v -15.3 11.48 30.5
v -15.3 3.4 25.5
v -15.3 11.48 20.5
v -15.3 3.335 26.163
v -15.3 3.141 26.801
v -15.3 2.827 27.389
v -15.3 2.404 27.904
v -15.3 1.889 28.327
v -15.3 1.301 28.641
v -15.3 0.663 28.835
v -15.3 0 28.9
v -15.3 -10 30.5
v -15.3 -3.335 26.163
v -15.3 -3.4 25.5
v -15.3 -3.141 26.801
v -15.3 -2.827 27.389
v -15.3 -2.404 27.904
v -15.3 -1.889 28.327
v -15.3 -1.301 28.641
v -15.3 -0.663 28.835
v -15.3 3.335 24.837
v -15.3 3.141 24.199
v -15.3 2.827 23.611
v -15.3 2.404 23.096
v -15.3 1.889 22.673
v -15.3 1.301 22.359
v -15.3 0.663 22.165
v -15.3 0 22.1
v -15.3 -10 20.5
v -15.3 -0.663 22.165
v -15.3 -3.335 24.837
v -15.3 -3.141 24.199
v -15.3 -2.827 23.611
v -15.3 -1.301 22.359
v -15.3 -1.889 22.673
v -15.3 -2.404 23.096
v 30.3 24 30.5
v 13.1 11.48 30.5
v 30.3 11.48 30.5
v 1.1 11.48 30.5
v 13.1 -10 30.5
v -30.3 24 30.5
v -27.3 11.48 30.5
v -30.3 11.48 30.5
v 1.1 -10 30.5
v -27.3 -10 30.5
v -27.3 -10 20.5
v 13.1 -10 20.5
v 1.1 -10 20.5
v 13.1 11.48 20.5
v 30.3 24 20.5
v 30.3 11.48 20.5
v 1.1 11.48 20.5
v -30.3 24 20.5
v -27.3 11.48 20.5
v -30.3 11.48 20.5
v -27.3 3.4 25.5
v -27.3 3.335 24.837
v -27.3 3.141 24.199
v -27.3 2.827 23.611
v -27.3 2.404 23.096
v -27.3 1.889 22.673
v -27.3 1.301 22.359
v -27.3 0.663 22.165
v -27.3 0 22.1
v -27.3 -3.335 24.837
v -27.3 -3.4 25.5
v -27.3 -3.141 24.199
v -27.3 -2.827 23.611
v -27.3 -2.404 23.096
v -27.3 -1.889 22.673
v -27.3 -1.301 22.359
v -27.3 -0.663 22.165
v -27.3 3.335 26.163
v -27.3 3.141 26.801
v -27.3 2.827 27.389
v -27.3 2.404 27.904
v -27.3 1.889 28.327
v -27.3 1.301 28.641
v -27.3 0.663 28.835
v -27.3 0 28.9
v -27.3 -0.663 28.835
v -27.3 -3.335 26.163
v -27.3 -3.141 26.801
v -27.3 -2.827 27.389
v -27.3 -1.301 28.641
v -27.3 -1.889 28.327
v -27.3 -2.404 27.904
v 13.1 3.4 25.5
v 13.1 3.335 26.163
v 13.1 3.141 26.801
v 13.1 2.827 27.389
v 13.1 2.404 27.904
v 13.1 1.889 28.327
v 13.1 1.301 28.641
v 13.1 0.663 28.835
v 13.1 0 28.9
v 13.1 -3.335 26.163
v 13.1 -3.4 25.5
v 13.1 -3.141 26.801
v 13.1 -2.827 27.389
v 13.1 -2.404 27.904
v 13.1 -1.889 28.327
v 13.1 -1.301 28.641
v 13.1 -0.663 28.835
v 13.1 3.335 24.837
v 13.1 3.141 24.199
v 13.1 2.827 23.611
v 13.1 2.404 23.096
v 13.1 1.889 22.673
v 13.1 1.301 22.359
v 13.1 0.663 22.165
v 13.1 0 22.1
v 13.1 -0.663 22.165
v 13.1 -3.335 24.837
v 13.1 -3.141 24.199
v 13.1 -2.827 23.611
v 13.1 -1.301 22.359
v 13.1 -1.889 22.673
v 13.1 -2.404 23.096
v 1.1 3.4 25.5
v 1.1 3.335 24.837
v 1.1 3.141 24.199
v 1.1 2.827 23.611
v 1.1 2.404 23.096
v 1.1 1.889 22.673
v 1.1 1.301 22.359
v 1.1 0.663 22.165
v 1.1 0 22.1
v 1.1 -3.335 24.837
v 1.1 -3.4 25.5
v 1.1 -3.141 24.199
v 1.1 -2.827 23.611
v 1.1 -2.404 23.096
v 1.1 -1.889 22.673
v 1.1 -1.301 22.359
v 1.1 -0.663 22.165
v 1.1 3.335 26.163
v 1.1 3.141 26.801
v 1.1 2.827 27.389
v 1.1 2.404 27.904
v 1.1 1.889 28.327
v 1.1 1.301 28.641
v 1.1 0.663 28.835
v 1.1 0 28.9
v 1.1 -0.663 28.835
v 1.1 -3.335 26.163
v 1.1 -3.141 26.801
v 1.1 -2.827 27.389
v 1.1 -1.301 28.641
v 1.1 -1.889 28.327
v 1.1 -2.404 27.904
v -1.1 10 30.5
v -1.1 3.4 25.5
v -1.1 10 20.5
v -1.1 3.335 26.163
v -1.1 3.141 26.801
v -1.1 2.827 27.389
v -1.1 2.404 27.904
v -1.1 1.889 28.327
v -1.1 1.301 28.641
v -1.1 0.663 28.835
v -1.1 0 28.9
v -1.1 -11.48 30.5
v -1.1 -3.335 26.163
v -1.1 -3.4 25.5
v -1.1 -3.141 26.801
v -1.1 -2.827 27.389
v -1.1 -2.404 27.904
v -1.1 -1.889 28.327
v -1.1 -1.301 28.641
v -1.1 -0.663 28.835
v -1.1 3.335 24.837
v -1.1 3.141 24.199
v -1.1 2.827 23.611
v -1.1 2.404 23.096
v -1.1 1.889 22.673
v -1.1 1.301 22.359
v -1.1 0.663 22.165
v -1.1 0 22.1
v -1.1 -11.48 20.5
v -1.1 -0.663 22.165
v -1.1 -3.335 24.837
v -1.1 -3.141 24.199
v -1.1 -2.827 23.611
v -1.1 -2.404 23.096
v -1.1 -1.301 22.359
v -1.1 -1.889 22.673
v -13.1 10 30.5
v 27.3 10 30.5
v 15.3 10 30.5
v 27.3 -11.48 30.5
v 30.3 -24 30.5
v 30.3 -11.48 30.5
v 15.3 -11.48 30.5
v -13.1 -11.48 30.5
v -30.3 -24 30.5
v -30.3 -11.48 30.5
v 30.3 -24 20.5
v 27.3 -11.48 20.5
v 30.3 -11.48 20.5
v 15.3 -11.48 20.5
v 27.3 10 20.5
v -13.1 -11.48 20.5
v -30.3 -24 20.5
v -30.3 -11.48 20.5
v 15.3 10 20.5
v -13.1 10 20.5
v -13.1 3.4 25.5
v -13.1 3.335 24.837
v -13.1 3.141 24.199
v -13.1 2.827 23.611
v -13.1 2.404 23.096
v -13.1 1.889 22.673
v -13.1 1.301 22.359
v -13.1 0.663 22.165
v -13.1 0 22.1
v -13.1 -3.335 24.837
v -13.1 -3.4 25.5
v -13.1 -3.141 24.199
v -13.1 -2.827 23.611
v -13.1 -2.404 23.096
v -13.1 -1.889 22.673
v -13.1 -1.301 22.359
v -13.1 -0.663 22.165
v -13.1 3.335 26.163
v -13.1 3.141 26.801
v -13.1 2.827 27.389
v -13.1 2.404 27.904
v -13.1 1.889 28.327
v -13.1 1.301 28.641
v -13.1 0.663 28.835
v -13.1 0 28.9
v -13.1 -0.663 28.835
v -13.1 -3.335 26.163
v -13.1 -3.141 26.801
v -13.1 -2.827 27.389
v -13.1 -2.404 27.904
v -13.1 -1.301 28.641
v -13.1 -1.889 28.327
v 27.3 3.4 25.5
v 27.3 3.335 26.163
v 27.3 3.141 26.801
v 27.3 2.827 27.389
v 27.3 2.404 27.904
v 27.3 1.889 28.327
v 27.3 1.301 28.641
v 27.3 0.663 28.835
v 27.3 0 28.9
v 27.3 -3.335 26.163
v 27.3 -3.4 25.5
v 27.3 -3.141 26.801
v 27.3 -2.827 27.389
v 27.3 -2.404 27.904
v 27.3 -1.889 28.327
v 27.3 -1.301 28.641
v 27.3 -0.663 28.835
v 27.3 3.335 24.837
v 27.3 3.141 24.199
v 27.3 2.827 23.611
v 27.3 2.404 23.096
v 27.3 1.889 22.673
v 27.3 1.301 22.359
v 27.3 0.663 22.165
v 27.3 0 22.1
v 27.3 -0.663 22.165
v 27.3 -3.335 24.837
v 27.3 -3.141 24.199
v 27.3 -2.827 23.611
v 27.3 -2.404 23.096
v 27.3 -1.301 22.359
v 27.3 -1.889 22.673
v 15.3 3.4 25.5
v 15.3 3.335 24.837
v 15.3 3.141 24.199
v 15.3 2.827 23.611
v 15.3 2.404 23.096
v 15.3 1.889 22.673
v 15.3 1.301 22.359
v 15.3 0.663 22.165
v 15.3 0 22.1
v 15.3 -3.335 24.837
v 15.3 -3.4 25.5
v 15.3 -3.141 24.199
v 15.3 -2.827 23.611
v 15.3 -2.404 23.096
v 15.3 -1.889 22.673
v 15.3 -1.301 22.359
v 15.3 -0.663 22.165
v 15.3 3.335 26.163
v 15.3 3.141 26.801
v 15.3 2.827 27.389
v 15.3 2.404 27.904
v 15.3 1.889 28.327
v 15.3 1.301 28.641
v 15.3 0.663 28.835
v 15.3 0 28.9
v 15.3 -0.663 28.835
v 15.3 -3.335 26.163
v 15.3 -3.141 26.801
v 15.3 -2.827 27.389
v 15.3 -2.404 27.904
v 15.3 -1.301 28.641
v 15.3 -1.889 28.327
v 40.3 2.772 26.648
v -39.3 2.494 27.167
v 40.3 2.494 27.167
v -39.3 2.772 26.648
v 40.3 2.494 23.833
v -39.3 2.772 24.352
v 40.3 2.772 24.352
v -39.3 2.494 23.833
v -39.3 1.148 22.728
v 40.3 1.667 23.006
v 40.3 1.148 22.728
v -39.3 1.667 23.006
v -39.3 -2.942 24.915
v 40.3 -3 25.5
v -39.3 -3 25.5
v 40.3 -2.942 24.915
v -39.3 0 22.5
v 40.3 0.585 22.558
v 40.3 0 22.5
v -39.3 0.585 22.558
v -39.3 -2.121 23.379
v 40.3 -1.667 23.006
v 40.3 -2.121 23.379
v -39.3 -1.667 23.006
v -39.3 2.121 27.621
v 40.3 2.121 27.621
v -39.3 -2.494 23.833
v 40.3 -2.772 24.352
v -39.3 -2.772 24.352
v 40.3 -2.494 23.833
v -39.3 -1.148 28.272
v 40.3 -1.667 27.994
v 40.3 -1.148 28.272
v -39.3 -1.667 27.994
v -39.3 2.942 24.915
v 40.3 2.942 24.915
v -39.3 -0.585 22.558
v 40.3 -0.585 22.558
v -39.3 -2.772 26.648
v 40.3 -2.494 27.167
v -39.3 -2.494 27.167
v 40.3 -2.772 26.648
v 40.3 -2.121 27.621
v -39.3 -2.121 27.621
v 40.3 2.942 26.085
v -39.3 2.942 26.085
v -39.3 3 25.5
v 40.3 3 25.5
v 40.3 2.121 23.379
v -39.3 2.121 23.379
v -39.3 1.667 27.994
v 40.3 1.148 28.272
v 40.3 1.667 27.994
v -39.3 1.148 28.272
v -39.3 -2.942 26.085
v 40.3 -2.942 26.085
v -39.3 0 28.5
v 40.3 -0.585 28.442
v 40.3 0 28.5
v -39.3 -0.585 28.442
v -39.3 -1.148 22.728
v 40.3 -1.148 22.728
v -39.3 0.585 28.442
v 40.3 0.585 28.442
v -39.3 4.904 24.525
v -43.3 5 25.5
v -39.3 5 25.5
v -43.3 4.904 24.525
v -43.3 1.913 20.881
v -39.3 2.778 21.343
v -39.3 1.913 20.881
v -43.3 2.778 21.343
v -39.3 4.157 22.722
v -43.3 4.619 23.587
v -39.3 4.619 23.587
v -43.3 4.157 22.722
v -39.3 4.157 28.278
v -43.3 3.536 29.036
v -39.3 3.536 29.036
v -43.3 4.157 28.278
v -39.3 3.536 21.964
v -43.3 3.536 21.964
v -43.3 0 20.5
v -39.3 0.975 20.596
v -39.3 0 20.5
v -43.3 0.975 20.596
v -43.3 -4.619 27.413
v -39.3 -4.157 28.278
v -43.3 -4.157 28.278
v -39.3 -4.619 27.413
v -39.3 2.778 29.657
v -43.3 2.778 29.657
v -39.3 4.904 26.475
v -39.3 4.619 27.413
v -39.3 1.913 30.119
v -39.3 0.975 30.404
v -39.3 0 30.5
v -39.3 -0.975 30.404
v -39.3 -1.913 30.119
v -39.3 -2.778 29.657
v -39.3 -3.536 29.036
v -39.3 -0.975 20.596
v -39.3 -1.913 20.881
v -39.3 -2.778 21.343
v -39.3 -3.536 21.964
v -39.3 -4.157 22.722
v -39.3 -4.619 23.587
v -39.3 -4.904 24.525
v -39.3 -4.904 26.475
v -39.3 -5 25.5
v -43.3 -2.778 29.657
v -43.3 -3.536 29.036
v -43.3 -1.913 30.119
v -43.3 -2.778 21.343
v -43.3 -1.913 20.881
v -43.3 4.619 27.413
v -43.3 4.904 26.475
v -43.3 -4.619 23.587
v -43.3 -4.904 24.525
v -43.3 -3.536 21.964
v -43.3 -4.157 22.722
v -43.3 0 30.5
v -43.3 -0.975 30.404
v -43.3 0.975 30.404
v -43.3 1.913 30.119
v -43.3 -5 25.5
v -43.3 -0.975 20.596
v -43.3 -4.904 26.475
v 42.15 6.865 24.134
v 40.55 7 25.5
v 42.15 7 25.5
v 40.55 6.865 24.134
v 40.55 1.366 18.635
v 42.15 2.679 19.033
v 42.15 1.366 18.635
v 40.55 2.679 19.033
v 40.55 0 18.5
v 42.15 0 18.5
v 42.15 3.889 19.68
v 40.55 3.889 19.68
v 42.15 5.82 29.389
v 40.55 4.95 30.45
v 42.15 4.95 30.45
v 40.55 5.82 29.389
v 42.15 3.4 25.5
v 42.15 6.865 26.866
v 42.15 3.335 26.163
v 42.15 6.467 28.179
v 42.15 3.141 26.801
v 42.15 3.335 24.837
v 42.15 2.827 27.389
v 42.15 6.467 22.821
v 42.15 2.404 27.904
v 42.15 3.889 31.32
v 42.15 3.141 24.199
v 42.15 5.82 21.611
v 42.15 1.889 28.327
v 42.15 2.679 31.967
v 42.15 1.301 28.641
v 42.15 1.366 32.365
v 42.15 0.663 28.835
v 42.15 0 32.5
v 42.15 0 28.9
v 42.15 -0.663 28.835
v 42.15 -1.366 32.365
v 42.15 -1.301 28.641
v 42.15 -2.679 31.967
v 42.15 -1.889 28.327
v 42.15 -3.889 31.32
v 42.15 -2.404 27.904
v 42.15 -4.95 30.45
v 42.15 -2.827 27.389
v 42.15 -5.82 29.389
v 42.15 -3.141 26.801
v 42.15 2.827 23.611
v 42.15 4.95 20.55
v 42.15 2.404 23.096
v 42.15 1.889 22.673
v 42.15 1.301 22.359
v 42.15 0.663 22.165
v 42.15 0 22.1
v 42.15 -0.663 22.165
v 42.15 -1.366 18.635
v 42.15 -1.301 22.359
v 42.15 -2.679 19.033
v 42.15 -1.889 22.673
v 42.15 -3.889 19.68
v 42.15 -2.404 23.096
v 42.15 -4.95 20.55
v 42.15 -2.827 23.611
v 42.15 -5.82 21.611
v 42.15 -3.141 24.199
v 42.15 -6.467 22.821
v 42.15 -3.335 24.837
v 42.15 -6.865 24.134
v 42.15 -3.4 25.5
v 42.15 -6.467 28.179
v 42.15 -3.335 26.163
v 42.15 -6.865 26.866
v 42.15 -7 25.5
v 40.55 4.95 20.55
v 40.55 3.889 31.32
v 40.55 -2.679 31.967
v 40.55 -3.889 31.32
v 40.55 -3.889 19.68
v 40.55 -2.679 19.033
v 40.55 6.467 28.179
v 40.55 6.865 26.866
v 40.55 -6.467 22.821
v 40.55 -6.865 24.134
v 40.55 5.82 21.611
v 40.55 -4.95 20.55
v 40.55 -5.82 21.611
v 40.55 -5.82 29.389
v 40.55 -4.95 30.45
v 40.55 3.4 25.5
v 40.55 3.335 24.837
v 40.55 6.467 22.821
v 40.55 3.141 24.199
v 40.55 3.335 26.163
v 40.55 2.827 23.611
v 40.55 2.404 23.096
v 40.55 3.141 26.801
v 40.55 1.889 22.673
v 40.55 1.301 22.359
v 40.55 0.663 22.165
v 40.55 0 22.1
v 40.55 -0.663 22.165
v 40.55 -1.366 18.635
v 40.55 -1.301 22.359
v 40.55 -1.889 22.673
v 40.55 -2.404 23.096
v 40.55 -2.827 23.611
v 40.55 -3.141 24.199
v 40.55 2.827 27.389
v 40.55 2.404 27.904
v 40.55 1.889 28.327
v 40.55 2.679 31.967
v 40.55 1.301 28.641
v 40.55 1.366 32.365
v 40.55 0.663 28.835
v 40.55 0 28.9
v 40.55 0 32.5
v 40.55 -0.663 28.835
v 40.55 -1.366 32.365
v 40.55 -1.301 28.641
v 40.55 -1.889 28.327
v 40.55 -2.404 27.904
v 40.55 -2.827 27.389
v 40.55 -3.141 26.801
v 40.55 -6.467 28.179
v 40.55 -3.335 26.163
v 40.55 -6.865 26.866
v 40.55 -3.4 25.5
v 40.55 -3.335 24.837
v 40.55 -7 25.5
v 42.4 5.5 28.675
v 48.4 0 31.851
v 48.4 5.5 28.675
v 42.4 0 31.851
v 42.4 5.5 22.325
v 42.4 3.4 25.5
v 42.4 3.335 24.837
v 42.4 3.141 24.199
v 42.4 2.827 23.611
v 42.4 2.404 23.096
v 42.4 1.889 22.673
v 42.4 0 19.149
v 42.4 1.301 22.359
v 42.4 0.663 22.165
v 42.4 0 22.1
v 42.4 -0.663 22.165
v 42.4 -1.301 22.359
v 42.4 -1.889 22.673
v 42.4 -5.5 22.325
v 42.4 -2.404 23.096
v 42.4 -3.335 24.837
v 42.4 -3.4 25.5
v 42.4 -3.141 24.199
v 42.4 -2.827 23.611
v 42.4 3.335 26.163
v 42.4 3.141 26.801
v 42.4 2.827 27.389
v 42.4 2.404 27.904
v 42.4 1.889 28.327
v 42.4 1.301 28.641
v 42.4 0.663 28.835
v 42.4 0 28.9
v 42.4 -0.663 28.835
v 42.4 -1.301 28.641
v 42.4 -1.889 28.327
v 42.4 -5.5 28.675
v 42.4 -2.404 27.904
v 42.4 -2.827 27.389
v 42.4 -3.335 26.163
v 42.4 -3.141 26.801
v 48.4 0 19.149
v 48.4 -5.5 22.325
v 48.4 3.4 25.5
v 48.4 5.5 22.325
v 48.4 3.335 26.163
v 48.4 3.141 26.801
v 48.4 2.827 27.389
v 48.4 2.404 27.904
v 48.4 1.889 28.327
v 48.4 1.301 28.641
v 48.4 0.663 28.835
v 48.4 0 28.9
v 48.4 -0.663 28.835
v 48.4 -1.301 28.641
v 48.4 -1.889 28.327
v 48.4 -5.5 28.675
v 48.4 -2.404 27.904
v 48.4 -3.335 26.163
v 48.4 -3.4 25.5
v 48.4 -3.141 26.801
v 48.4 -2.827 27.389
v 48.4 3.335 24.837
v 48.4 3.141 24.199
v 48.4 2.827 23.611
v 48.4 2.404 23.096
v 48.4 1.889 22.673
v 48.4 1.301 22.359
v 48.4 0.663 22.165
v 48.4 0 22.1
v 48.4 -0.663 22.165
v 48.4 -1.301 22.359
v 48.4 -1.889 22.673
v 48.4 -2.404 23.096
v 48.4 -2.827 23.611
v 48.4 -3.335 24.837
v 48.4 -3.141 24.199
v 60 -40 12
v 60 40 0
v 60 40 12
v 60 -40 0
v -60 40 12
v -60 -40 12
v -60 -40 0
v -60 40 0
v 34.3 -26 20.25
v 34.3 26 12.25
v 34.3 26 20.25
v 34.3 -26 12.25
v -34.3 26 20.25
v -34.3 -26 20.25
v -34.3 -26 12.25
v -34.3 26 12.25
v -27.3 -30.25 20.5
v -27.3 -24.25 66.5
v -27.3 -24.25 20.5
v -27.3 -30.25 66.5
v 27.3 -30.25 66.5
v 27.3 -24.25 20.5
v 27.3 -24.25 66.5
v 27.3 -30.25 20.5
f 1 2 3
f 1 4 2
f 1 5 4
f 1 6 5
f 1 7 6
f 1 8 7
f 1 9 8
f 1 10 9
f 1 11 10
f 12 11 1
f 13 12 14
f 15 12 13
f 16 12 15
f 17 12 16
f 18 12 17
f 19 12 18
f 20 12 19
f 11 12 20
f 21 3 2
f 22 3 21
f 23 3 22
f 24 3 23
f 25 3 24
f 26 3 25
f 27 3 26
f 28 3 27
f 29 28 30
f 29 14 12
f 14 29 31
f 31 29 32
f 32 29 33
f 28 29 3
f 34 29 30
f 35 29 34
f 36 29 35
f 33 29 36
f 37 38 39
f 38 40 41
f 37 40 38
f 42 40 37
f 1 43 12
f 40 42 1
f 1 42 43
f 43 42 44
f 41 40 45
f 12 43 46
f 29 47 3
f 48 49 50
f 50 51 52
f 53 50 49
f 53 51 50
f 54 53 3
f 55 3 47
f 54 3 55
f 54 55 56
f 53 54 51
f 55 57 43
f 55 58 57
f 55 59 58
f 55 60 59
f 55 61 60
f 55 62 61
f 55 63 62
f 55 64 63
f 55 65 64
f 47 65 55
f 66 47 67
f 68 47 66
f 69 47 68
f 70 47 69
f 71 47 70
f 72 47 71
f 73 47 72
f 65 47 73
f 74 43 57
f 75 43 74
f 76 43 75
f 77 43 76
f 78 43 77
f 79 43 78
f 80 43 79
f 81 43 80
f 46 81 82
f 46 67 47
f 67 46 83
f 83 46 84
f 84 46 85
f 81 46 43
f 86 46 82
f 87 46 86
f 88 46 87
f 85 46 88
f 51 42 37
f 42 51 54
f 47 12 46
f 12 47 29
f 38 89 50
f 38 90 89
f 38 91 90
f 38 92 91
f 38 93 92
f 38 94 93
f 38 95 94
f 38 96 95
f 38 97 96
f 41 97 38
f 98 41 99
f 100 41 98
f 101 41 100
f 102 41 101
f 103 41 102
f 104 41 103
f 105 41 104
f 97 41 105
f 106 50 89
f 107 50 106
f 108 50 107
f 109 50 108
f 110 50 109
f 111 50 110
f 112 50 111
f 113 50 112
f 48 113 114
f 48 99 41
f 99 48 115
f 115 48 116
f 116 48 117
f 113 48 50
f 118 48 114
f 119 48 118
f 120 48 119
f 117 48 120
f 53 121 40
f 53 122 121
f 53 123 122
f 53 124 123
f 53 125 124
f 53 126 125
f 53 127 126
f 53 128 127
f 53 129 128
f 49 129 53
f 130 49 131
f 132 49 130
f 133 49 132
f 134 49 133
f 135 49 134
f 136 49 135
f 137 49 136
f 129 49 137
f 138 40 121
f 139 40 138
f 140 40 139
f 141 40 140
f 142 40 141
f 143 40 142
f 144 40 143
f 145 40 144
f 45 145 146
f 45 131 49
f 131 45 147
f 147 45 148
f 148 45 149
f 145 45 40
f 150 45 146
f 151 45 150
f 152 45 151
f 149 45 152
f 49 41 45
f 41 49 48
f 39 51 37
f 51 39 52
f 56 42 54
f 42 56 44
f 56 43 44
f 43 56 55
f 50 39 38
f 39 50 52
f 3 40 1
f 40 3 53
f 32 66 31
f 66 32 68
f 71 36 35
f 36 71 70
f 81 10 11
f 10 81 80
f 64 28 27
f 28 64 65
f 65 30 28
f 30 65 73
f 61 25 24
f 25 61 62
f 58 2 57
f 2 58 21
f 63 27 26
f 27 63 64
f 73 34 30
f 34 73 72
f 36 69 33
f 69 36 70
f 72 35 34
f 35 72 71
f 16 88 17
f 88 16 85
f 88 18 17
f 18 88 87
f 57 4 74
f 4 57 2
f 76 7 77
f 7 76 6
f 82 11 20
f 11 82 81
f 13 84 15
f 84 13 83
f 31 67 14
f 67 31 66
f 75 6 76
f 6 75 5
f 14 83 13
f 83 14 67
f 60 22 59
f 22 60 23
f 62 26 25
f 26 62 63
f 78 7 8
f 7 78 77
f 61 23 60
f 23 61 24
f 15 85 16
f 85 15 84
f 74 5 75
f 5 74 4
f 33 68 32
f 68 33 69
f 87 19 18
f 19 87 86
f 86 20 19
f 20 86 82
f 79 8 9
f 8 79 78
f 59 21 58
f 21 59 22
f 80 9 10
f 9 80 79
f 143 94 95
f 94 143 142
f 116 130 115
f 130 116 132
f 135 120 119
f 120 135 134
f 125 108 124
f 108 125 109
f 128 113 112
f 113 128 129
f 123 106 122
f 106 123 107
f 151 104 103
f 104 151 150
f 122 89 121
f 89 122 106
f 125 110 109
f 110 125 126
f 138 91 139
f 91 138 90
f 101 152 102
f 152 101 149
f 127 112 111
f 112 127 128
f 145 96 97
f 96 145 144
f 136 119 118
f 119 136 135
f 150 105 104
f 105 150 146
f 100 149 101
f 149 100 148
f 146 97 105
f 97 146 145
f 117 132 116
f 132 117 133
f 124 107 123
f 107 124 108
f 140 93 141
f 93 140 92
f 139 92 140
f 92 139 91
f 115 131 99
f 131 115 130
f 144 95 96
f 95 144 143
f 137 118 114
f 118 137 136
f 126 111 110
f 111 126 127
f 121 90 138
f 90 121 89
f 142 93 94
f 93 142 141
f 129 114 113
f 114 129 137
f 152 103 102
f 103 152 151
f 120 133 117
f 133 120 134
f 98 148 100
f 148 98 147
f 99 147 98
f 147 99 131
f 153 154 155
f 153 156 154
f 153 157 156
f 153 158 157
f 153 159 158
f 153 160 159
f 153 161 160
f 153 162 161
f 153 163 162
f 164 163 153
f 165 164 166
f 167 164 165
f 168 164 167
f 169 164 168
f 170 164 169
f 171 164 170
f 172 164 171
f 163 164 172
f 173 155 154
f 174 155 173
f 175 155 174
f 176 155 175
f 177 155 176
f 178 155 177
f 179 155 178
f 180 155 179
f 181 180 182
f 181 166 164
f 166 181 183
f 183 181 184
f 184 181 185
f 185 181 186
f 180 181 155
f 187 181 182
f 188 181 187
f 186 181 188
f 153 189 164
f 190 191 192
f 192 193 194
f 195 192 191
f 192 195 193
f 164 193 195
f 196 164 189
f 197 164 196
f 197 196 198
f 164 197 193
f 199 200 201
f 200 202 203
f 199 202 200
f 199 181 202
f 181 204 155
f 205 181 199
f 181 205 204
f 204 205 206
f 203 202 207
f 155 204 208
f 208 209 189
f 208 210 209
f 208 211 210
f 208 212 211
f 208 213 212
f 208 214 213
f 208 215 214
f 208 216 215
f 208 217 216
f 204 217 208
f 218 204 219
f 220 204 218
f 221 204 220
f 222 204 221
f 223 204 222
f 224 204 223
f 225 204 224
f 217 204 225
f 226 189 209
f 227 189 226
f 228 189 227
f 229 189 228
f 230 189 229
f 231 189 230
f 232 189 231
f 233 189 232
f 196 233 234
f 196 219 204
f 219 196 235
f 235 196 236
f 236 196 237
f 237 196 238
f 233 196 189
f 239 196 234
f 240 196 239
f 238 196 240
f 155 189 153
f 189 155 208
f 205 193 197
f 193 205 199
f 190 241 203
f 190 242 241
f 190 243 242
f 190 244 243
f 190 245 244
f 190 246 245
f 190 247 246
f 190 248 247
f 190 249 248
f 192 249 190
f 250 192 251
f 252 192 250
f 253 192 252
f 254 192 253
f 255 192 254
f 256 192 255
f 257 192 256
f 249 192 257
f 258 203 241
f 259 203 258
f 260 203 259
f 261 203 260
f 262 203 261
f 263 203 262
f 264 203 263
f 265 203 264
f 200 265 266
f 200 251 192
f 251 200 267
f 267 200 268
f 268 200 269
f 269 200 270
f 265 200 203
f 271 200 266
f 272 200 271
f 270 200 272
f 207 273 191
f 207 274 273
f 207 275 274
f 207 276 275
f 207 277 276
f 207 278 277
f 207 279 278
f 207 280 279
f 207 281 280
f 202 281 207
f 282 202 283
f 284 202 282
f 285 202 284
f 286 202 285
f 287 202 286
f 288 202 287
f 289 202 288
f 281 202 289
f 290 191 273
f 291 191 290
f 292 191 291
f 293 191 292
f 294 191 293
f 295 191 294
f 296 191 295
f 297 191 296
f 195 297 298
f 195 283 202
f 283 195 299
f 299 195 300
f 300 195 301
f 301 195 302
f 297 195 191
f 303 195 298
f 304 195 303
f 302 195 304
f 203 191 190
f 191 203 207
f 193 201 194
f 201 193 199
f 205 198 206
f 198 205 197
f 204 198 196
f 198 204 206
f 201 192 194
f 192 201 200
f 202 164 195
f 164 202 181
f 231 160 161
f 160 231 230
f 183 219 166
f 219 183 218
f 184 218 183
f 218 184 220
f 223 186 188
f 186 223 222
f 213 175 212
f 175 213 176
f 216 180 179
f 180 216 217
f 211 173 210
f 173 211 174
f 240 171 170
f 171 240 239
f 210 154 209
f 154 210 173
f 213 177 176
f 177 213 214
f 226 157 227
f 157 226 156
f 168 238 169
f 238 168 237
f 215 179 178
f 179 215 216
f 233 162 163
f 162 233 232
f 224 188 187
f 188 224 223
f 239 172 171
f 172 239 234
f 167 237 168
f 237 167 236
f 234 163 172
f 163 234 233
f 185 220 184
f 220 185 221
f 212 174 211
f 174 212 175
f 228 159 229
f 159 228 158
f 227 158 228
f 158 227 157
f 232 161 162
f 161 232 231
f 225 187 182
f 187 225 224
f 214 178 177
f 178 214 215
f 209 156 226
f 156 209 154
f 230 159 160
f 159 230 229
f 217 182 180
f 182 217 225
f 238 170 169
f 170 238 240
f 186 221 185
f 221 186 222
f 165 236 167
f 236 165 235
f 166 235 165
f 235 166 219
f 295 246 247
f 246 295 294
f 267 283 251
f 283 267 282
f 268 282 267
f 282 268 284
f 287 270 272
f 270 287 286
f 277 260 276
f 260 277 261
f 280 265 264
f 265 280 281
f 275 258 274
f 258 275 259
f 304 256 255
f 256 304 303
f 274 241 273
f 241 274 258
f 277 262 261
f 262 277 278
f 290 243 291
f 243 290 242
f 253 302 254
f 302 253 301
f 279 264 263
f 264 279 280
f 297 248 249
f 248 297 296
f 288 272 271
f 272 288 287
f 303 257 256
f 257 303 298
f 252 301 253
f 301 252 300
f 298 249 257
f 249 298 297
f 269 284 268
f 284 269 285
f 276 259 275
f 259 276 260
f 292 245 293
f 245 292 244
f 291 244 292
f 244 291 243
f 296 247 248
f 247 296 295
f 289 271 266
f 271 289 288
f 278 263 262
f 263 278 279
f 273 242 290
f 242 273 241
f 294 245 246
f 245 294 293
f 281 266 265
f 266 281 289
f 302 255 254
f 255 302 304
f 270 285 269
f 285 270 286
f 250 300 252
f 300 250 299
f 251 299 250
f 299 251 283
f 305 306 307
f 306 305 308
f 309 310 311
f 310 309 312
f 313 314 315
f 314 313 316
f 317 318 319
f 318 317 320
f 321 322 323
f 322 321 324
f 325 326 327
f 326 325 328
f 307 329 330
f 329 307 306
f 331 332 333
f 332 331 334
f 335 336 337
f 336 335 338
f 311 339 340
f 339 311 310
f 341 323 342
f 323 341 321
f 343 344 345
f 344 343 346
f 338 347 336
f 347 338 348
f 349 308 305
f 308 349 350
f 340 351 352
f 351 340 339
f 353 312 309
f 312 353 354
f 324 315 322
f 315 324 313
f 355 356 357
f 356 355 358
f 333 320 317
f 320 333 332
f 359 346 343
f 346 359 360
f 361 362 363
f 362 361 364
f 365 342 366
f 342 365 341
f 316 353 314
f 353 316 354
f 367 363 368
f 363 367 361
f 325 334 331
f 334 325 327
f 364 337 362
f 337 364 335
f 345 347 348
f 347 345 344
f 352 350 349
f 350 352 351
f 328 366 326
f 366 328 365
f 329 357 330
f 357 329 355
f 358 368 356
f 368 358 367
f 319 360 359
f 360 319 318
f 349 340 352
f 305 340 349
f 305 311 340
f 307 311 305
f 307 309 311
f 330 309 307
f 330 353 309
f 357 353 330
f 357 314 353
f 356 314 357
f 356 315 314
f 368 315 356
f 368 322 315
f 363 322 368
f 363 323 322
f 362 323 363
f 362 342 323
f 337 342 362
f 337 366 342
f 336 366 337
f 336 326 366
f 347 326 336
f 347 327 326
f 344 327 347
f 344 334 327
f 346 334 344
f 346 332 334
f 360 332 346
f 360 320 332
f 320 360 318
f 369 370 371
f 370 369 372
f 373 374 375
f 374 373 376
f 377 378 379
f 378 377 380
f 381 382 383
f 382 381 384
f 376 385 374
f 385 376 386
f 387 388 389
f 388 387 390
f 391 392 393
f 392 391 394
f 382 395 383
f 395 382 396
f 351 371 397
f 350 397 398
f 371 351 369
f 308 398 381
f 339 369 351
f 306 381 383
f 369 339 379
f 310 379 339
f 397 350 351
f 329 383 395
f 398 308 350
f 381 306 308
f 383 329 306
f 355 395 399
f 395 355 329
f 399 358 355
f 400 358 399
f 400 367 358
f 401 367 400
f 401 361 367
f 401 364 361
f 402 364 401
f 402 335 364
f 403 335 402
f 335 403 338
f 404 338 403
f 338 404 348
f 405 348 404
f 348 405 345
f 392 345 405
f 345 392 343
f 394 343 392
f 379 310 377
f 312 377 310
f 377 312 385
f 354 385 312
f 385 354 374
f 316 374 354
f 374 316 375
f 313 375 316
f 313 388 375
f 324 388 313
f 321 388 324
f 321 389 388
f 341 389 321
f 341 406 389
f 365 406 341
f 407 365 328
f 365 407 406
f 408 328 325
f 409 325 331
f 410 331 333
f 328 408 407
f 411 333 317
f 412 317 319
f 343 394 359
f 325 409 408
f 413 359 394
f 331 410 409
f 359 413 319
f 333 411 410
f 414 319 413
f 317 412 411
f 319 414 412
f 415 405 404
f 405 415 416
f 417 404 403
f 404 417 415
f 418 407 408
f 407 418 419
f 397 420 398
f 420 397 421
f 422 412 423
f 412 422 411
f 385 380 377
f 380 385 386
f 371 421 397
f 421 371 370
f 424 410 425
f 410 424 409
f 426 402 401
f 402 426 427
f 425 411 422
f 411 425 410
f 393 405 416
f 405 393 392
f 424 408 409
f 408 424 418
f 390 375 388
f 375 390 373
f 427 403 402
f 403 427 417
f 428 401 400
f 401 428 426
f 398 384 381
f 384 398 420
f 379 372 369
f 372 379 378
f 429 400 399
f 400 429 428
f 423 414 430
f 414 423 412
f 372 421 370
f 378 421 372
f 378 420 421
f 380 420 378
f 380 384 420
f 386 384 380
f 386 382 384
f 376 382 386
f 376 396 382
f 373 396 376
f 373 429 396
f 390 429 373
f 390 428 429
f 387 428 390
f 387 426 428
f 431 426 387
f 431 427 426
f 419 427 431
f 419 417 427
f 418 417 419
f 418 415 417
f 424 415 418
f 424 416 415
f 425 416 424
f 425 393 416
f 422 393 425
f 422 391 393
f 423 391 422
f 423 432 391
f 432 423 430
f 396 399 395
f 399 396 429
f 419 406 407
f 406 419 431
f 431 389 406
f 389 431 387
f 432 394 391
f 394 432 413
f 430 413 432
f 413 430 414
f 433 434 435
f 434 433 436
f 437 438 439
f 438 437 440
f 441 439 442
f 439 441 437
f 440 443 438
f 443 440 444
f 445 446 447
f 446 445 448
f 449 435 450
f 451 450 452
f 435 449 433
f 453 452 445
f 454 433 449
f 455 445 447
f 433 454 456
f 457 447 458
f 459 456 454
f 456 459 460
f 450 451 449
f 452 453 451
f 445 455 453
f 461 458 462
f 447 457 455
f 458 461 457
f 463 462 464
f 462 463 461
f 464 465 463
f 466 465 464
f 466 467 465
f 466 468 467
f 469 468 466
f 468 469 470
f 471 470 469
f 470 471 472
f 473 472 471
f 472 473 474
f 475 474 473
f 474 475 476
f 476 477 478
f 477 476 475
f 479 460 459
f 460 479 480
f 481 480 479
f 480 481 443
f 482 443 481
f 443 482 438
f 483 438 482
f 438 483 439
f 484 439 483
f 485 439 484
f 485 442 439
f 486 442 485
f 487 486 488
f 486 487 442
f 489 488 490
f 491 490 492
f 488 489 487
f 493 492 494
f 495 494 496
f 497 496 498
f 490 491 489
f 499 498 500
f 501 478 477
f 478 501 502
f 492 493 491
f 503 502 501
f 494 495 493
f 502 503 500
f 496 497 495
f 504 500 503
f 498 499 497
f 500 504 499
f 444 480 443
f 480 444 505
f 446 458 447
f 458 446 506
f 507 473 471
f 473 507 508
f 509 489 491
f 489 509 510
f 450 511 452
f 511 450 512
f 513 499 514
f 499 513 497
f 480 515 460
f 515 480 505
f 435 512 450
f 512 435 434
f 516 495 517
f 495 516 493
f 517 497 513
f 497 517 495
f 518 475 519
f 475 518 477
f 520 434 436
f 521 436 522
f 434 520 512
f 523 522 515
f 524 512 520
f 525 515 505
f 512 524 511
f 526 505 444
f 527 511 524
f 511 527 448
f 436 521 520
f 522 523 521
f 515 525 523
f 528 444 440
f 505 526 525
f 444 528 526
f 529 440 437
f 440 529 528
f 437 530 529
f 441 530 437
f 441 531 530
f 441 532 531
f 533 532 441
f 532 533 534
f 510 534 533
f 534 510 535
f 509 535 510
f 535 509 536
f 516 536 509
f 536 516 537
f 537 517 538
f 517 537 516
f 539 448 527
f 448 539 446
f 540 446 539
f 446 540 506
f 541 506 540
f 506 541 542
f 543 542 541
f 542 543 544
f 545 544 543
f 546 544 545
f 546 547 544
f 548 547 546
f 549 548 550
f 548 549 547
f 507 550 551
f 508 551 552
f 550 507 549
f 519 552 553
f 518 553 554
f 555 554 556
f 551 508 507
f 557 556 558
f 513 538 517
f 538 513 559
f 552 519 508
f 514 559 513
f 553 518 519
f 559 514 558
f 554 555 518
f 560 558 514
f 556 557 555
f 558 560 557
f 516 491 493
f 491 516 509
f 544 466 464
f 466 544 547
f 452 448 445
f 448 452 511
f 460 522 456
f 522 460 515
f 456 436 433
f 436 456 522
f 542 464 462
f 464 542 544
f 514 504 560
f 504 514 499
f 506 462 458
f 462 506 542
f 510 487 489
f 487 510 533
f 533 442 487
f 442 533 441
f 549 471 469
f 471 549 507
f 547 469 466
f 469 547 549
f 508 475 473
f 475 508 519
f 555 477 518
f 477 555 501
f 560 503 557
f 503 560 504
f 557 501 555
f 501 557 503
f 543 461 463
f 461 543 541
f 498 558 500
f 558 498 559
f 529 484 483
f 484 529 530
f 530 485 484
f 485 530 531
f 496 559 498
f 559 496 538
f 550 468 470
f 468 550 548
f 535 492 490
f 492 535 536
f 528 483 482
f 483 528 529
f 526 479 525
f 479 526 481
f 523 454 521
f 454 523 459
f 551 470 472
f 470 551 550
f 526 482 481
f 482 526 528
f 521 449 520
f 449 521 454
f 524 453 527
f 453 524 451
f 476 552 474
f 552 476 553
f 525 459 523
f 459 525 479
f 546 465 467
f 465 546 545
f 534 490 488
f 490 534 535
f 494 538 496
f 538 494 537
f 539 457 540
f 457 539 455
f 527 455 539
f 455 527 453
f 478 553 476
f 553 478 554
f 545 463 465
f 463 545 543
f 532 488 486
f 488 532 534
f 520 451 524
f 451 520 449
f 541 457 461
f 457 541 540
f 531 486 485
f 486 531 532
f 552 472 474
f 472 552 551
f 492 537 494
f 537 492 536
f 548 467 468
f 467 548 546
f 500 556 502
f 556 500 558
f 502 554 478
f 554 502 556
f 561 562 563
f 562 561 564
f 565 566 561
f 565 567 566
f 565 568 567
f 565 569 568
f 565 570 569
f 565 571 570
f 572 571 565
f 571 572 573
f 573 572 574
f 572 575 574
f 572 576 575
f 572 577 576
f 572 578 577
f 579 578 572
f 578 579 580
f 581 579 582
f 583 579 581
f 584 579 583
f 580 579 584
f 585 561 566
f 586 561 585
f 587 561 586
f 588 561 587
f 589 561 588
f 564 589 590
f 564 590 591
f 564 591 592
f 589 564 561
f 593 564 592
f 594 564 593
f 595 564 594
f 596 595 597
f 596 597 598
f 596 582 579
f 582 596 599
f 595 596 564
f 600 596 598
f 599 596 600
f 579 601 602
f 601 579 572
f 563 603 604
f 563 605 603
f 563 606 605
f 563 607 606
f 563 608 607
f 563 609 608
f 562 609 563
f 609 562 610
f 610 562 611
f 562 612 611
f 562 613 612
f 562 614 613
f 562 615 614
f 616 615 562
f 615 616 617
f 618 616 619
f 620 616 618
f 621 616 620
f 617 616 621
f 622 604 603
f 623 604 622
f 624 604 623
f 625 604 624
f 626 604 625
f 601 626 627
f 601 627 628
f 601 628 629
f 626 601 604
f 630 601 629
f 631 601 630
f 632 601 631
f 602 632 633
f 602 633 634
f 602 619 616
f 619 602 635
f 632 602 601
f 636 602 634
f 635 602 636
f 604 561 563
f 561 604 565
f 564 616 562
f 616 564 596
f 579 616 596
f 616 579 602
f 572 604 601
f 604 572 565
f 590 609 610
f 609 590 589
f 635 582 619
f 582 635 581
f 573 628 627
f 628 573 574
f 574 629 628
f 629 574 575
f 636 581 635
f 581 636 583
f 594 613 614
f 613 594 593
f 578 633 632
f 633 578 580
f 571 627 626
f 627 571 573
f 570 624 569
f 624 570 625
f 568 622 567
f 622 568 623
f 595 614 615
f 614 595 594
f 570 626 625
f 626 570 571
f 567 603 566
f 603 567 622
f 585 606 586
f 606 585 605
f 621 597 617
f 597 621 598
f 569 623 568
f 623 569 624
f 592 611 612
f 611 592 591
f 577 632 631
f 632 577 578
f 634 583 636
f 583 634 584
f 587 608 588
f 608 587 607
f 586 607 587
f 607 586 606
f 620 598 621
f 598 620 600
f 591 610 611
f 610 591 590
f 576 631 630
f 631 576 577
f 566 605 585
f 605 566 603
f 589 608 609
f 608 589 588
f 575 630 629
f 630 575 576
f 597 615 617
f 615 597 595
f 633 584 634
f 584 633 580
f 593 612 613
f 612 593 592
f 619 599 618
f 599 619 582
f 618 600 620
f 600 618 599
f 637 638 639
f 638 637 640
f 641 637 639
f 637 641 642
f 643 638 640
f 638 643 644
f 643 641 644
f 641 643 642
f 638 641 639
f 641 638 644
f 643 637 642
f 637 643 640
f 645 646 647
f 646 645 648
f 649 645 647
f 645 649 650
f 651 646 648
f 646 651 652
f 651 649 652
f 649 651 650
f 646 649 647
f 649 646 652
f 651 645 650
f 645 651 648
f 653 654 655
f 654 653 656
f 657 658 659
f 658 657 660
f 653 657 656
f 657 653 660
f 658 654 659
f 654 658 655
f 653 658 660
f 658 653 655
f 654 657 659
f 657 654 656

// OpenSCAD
$fn = 32;

// ------------------------------------------------------------------------
// Comb hinge with flap: leaf 60.6 x 24 mm, pin d6, flap 46 mm
// Every part is its own module, assembly() places every instance.
// ------------------------------------------------------------------------

// --- part 1 ---
module hinge_bed() {
  difference() {
    translate([-60, -40, 0]) cube([120, 80, 12]);
  }
}

// --- part 2 ---
module hinge_riser() {
  difference() {
    translate([-34.3, -26, 0]) cube([68.6, 52, 8]);
  }
}

// --- part 3 ---
module hinge_leaf_a() {
  difference() {
    union() {
      translate([-27.3, -10, -5]) cube([12, 34, 10]);
      translate([1.1, -10, -5]) cube([12, 34, 10]);
      translate([-30.3, 11.48, -5]) cube([60.6, 12.52, 10]);
    }
    translate([-21.3, 0, 0]) rotate([0, 90, 0]) cylinder(h = 14, d = 6.8, center = true);
    translate([7.1, 0, 0]) rotate([0, 90, 0]) cylinder(h = 14, d = 6.8, center = true);
  }
}

// --- part 4 ---
module hinge_leaf_b() {
  difference() {
    union() {
      translate([-13.1, -24, -5]) cube([12, 34, 10]);
      translate([15.3, -24, -5]) cube([12, 34, 10]);
      translate([-30.3, -24, -5]) cube([60.6, 12.52, 10]);
    }
    translate([-7.1, 0, 0]) rotate([0, 90, 0]) cylinder(h = 14, d = 6.8, center = true);
    translate([21.3, 0, 0]) rotate([0, 90, 0]) cylinder(h = 14, d = 6.8, center = true);
  }
}

// --- part 5 ---
module hinge_flap() {
  difference() {
    translate([-27.3, -23, 0]) cube([54.6, 46, 6]);
  }
}

// --- part 6 ---
module hinge_pin() {
  rotate([0, 90, 0]) cylinder(h = 80.6, d = 6, center = true);
  translate([-43.3, 0, 0]) rotate([0, 90, 0]) cylinder(h = 4, d = 10);
}

// --- part 7 ---
module pin_washer() {
  difference() {
      translate([0, 0, 0]) cylinder(h = 1.6, d = 14);
      translate([0, 0, -1]) cylinder(h = 3.6, d = 6.8);
    }
}

// --- part 8 ---
module pin_nut() {
  difference() {
    linear_extrude(height = 6) polygon(points = [[6.351, 0], [3.175, 5.5], [-3.175, 5.5], [-6.351, 0], [-3.175, -5.5], [3.175, -5.5]]);
    translate([0, 0, -1]) cylinder(h = 8, d = 6.8);
  }
}

// --- assembly ---
module assembly() {
  color([0.80, 0.24, 0.20]) translate([0, 0, 0]) rotate([0, 0, 0]) hinge_bed();
  color([0.20, 0.45, 0.75]) translate([0, 0, 12.25]) rotate([0, 0, 0]) hinge_riser();
  color([0.25, 0.62, 0.32]) translate([0, 0, 25.5]) rotate([0, 0, 0]) hinge_leaf_a();
  color([0.92, 0.70, 0.18]) translate([0, 0, 25.5]) rotate([0, 0, 0]) hinge_leaf_b();
  color([0.58, 0.35, 0.70]) translate([0, -24.25, 43.5]) rotate([90, 0, 0]) hinge_flap();
  color([0.16, 0.66, 0.66]) translate([0, 0, 25.5]) rotate([0, 0, 0]) hinge_pin();
  color([0.85, 0.48, 0.18]) translate([40.55, 0, 25.5]) rotate([0, 90, 0]) pin_washer();
  color([0.55, 0.60, 0.65]) translate([42.4, 0, 25.5]) rotate([0, 90, 0]) pin_nut();
}

assembly();
